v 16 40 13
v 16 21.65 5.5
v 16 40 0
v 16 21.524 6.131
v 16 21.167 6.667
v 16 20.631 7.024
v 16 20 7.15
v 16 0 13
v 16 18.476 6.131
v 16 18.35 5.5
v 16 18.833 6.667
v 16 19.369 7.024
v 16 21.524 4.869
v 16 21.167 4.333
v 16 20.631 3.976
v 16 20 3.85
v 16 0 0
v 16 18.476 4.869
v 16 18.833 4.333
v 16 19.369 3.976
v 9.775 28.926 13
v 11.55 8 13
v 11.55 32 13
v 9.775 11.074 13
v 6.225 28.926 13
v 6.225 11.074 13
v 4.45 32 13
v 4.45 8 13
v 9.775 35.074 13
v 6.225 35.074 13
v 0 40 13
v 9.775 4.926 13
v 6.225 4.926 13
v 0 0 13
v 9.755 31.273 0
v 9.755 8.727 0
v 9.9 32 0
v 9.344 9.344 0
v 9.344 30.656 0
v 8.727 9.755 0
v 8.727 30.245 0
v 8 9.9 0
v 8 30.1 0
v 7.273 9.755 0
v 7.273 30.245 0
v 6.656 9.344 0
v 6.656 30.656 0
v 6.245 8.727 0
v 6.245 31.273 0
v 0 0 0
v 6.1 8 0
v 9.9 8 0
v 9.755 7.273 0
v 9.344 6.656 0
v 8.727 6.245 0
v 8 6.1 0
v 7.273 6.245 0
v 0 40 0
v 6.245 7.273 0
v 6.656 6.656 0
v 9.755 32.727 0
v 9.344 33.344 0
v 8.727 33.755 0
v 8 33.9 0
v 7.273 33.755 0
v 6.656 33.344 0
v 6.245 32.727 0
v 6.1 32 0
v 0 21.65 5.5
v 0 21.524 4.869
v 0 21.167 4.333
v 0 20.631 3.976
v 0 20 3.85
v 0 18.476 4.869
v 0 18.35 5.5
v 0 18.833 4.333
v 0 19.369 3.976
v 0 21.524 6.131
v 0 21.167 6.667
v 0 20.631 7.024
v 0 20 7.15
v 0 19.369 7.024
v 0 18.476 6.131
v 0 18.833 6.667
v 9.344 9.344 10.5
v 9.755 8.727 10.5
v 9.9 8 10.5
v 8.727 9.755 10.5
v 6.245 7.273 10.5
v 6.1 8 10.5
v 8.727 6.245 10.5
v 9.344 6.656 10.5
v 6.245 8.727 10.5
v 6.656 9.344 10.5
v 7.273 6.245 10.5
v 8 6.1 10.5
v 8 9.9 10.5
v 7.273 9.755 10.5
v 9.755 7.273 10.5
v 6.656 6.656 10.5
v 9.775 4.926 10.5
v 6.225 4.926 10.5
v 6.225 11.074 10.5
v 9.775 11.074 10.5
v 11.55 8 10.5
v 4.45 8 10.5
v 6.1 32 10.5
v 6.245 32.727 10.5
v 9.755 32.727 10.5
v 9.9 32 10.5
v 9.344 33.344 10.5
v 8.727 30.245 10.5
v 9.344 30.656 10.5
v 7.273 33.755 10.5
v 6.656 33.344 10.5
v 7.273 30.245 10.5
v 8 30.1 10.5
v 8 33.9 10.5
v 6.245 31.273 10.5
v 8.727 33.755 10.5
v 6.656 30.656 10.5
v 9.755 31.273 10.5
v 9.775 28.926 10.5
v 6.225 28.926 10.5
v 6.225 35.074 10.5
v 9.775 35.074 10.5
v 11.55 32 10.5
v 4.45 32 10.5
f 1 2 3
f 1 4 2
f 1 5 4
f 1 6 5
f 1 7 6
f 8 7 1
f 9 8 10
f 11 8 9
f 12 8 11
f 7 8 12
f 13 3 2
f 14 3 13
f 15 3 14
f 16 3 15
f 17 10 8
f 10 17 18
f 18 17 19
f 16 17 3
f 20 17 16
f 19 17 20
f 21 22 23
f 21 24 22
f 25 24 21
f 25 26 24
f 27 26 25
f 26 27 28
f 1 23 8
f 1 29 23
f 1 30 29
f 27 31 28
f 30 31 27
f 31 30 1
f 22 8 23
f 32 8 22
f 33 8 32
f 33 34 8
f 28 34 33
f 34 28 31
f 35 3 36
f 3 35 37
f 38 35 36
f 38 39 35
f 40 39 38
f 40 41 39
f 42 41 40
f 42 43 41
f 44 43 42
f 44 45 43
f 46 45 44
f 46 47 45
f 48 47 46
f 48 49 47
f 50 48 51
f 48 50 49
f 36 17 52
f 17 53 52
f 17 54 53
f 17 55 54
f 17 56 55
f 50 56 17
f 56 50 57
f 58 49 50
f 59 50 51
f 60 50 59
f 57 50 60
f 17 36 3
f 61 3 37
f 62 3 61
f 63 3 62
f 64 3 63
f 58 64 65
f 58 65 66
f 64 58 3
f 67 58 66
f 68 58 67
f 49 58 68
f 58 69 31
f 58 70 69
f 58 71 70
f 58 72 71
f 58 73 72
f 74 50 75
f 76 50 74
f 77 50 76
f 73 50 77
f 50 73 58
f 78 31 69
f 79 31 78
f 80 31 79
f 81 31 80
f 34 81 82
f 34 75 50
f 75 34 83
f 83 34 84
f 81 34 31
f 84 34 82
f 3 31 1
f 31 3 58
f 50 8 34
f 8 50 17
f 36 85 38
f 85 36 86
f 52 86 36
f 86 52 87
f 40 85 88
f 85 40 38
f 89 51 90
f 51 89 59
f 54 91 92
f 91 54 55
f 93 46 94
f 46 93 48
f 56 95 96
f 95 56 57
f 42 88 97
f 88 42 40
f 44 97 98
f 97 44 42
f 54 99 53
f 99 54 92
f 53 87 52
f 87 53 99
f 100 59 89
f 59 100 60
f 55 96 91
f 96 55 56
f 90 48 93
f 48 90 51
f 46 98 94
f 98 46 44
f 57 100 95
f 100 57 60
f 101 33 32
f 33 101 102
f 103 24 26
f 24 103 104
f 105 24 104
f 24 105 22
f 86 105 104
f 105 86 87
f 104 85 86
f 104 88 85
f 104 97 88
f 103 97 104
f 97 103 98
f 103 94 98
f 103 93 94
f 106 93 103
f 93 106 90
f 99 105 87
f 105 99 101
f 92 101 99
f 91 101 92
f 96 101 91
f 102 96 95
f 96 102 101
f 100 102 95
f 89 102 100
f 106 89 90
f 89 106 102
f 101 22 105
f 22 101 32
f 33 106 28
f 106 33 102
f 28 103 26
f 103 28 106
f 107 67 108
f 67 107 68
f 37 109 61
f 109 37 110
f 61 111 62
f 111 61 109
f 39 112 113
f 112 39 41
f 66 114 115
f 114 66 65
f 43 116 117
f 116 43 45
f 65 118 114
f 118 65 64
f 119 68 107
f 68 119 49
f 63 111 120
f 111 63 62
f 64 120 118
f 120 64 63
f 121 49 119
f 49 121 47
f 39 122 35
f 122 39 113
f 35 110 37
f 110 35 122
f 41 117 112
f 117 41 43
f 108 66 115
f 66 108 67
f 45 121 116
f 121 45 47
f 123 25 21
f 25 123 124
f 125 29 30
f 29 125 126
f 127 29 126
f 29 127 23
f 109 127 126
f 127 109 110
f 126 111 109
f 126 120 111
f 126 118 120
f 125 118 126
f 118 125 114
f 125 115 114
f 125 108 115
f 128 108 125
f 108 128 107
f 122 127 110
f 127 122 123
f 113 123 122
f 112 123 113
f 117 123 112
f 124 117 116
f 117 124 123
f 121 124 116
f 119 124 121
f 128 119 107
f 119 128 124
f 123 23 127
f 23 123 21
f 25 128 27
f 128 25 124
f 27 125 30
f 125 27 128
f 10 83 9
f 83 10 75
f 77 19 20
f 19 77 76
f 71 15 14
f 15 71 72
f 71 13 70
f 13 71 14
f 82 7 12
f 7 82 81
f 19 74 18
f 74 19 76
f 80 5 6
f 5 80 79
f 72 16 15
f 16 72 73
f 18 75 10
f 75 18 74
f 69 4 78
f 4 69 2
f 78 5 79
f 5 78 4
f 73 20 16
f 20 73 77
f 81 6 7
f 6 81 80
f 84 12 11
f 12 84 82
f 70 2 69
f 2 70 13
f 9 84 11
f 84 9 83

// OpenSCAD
length=40;
width=16;
inset=8;
recess=2;
m3clearH=3.3;
m3clearV=3.8;
m3nutV=7.1;
nutTrapHeight=2.5;
overlap=1;

difference() {
	cube([width,length,15-recess]);
	translate([width/2,inset,-1]) cylinder(r=m3clearV/2,h=15,$fn=16);
	translate([width/2,inset,15-recess-nutTrapHeight]) cylinder(r=m3nutV/2,h=15,$fn=6);
	translate([width/2,length-inset,-1]) cylinder(r=m3clearV/2,h=15,$fn=16);
	translate([width/2,length-inset,15-recess-nutTrapHeight]) cylinder(r=m3nutV/2,h=15,$fn=6);
	translate([-overlap,length/2,15/2-recess])
		rotate([0,90,0]) cylinder(r=m3clearH/2,h=width+2*overlap,$fn=16);
}
